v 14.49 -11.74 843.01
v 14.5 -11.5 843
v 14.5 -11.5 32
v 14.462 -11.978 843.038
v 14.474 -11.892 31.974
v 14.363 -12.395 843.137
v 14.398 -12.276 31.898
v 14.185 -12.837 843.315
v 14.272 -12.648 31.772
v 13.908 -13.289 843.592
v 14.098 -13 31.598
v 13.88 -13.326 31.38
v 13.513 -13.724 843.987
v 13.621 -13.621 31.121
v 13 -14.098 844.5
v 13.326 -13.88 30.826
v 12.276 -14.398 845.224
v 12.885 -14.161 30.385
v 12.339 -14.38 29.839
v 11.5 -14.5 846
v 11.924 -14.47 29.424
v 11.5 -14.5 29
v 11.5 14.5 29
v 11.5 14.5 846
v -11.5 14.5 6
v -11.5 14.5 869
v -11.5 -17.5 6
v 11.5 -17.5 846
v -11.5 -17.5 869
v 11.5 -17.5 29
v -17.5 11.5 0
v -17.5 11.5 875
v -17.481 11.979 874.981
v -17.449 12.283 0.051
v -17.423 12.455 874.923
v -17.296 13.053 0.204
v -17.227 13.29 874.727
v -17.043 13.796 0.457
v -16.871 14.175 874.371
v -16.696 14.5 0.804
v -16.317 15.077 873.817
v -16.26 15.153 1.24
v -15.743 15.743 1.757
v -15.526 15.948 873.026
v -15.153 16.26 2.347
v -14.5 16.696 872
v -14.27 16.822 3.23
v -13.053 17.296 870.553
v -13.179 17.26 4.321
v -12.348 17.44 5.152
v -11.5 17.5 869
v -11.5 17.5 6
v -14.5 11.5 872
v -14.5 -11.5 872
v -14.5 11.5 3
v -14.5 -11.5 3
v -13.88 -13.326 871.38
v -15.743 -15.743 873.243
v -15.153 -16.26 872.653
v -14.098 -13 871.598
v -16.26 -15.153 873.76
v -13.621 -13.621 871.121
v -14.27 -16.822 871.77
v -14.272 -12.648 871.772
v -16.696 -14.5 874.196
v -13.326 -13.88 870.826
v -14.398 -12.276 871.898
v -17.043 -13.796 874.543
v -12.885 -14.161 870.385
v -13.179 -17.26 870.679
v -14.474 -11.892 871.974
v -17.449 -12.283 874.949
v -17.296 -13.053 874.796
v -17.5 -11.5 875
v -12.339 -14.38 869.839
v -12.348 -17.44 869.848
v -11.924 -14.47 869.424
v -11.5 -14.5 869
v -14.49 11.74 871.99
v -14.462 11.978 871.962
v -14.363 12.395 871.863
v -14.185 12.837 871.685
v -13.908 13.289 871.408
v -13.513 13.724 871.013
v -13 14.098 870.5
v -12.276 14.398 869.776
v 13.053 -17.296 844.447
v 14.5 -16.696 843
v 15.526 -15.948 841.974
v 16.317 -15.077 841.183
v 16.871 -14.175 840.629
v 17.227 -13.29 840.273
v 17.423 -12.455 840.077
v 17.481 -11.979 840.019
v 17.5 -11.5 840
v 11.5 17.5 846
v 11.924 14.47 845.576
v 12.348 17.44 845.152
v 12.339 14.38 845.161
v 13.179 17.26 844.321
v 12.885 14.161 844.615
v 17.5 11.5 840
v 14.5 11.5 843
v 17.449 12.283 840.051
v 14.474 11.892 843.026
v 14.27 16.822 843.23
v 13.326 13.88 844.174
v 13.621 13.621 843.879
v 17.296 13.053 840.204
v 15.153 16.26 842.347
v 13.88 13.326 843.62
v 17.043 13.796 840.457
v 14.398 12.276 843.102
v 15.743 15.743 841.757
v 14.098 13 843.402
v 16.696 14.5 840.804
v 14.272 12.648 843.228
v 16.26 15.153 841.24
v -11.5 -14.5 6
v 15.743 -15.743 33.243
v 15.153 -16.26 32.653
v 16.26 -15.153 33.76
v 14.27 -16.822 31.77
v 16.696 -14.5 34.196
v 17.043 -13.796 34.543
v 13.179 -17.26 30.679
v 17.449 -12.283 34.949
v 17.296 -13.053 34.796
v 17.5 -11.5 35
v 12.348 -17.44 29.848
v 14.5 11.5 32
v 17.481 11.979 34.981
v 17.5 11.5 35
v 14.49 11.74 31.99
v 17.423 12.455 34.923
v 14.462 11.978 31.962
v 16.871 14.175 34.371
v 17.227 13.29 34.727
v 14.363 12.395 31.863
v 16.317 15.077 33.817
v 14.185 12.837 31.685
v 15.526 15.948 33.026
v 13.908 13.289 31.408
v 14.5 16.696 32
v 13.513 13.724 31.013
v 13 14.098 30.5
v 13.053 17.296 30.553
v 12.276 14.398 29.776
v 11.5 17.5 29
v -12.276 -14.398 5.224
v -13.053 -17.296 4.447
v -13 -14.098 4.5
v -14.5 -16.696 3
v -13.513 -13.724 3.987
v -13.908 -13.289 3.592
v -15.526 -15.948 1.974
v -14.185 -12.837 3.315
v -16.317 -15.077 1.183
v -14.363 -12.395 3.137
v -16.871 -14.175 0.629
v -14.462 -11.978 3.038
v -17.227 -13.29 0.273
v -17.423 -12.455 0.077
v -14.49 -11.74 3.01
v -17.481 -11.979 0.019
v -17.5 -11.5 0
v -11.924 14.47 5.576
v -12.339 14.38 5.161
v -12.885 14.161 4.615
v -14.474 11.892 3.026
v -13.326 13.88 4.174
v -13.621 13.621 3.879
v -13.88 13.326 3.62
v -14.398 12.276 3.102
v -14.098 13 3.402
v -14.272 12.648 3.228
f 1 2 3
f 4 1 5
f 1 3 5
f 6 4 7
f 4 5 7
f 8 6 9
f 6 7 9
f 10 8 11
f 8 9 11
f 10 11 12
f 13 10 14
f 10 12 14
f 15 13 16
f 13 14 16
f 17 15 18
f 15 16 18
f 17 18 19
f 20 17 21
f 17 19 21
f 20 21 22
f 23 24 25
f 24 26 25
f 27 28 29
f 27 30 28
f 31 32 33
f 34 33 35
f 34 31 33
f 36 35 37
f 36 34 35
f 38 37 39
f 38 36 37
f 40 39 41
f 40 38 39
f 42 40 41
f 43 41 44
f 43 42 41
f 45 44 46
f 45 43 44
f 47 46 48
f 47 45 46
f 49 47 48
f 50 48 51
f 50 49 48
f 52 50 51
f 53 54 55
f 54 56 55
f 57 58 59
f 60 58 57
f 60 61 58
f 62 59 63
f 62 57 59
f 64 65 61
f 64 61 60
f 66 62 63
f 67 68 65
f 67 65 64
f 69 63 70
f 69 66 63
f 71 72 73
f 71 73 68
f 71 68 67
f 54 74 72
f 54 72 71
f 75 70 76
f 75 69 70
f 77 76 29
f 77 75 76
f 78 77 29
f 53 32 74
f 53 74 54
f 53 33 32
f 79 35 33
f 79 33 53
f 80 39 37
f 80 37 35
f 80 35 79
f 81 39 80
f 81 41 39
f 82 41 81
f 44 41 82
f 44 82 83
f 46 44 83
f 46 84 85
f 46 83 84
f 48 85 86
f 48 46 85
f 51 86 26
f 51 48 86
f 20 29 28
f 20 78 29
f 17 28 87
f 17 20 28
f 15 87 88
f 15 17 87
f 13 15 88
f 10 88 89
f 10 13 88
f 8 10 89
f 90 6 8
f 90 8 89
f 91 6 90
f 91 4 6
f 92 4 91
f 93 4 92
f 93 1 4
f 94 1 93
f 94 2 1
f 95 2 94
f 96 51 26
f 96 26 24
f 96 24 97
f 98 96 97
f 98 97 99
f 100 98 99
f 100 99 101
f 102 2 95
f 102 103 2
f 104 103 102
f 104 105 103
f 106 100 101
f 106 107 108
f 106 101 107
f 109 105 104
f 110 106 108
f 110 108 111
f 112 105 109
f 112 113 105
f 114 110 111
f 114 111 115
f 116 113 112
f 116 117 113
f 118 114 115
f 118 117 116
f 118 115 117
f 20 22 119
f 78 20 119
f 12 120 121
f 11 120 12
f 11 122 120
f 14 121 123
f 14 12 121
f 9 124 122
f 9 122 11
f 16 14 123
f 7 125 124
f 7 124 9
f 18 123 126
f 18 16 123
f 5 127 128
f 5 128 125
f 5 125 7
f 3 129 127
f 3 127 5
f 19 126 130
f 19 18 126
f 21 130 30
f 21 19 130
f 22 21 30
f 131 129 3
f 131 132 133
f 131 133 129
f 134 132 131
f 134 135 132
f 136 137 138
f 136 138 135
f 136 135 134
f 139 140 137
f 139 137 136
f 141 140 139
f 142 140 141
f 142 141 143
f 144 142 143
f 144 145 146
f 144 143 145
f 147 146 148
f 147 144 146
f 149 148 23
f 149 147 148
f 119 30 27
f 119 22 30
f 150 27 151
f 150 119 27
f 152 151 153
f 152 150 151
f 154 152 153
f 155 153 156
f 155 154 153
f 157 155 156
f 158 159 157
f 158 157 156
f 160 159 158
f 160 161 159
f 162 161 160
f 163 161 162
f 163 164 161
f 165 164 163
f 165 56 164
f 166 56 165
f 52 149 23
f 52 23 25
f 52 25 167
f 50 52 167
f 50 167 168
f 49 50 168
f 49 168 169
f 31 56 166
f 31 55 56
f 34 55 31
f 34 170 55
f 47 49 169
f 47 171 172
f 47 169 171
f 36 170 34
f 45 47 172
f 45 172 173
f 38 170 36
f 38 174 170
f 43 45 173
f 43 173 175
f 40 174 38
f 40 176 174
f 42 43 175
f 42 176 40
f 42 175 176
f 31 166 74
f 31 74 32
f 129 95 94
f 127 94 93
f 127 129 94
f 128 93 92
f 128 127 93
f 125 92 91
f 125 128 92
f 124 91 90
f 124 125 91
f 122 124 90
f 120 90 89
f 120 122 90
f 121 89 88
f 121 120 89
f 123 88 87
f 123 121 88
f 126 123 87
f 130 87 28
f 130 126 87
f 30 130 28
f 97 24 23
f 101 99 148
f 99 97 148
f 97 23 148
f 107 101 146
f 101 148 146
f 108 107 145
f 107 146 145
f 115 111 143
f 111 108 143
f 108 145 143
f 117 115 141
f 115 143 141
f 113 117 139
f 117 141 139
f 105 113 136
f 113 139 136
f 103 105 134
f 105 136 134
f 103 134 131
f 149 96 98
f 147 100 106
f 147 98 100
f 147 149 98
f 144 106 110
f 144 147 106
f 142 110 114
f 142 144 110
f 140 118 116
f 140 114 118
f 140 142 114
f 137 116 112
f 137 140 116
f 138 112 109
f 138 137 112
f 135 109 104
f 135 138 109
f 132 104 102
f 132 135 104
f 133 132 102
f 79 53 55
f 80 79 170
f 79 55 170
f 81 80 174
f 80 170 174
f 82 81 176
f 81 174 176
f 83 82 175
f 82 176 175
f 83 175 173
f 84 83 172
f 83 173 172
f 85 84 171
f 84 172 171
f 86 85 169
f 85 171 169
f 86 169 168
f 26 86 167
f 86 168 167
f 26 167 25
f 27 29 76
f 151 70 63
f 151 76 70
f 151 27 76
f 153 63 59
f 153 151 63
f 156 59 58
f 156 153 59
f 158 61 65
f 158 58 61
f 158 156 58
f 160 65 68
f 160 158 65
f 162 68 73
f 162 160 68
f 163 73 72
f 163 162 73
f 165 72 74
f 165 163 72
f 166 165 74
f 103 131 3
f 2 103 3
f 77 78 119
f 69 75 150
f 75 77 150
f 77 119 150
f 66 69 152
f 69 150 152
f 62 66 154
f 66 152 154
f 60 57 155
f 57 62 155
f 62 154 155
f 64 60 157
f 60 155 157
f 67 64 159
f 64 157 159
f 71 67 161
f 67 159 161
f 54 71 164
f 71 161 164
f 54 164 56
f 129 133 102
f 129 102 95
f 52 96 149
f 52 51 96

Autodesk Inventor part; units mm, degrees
ref_plane "YZ Plane" through (0, 0, 0) normal (1, 0, 0) x (0, 1, 0)
ref_plane "Počáteční rovina" through (0, 0, 0) normal (0, 0, 1) x (1, 0, 0)
ref_plane "Koncová rovina" through (0, 0, 875) normal (0, 0, 1) x (1, 0, 0)
sketch "Náčrt1" plane through (0, 0, 0) normal (0, 0, 1) x (1, 0, 0)
  line L0 (-11.5, 17.5) -> (11.5, 17.5)
  line L1 (17.5, 11.5) -> (17.5, -11.5)
  line L2 (11.5, -17.5) -> (-11.5, -17.5)
  line L3 (-17.5, -11.5) -> (-17.5, 11.5)
  arc A0 (-11.5, 17.5) -> (-17.5, 11.5) centre (-11.5, 11.5) ccw
  arc A1 (17.5, 11.5) -> (11.5, 17.5) centre (11.5, 11.5) ccw
  arc A2 (11.5, -17.5) -> (17.5, -11.5) centre (11.5, -11.5) ccw
  arc A3 (-17.5, -11.5) -> (-11.5, -17.5) centre (-11.5, -11.5) ccw
  line L4 (-21.8698, 0) -> (21.8698, 0) construction
  line L5 (0, -21.8698) -> (0, 21.8698) construction
  arc A4 (-11.5, 14.5) -> (-14.5, 11.5) centre (-11.5, 11.5) ccw
  line L6 (-11.5, 14.5) -> (11.5, 14.5)
  arc A5 (14.5, 11.5) -> (11.5, 14.5) centre (11.5, 11.5) ccw
  line L7 (14.5, 11.5) -> (14.5, -11.5)
  arc A6 (11.5, -14.5) -> (14.5, -11.5) centre (11.5, -11.5) ccw
  line L8 (11.5, -14.5) -> (-11.5, -14.5)
  arc A7 (-14.5, -11.5) -> (-11.5, -14.5) centre (-11.5, -11.5) ccw
  line L9 (-14.5, -11.5) -> (-14.5, 11.5)
  point P0 (-17.5, 17.5)
  point P1 (17.5, -17.5)
  point P2 (17.5, 17.5)
  dimension "b" = 35
  dimension "msp_r" = 6
  dimension "d8" = 17.5
  dimension "d9" = 17.5
  dimension "d10" = 3
extrude "Těleso" add sketch "Náčrt1" along normal up to surface (875 mm away) from surface at 0
sketch "Sketch2" plane through (0, 0, 0) normal (0, 0, 1) x (1, 0, 0)
  line L0 (0, 0) -> (10, 0)
ref_plane "Work Plane3" through (0, 0, 0) normal (0, -1, 0) x (1, 0, 0)
sketch "Sketch3" plane through (0, 0, 0) normal (0, -1, 0) x (1, 0, 0)
  line L0 (-2, 0) -> (12, 0)
  line L1 (-2, 875) -> (12, 875)
  dimension "d14" = 875
sketch "Náčrt4" plane through (11.5, 17.5, 875) normal (0, 1, 0) x (1, 0, 0)
  line L0 (-29, 875) -> (-29, 0) construction
  line L1 (6, 875) -> (6, 0) construction
  line L2 (-29, 875) -> (6, 875)
  line L3 (6, 875) -> (6, 840)
  line L4 (-29, 875) -> (-29, 0) construction
  line L5 (6, 840) -> (-29, 875)
  line L6 (-29, 0) -> (6, 35)
  line L7 (6, 875) -> (6, 0) construction
  line L8 (6, 35) -> (6, 0)
  line L9 (6, 0) -> (-29, 0)
  point P0 (-11.5, 875)
  dimension "d15" = 45
  dimension "d16" = 45
extrude "Vysunutí2" cut sketch "Náčrt4" against normal through all
equation "\"msp_r\" = 2 * ParT"
equation "\"d8\" = d9"
equation "\"d9\" = 0.5 * b"
equation "\"d10\" = ParT"
equation "\"G_OFFSET_START\" = 0"
equation "\"G_OFFSET_END\" = 0"
equation "\"d12\" = G_OFFSET_END + B_L"
equation "\"G_L\" = d14"
equation "\"B_L\" = 875"
equation "\"ParT\" = 3"
properties part number "CSN 426935 - 35x35x3-875" material "Nerezová ocel"
